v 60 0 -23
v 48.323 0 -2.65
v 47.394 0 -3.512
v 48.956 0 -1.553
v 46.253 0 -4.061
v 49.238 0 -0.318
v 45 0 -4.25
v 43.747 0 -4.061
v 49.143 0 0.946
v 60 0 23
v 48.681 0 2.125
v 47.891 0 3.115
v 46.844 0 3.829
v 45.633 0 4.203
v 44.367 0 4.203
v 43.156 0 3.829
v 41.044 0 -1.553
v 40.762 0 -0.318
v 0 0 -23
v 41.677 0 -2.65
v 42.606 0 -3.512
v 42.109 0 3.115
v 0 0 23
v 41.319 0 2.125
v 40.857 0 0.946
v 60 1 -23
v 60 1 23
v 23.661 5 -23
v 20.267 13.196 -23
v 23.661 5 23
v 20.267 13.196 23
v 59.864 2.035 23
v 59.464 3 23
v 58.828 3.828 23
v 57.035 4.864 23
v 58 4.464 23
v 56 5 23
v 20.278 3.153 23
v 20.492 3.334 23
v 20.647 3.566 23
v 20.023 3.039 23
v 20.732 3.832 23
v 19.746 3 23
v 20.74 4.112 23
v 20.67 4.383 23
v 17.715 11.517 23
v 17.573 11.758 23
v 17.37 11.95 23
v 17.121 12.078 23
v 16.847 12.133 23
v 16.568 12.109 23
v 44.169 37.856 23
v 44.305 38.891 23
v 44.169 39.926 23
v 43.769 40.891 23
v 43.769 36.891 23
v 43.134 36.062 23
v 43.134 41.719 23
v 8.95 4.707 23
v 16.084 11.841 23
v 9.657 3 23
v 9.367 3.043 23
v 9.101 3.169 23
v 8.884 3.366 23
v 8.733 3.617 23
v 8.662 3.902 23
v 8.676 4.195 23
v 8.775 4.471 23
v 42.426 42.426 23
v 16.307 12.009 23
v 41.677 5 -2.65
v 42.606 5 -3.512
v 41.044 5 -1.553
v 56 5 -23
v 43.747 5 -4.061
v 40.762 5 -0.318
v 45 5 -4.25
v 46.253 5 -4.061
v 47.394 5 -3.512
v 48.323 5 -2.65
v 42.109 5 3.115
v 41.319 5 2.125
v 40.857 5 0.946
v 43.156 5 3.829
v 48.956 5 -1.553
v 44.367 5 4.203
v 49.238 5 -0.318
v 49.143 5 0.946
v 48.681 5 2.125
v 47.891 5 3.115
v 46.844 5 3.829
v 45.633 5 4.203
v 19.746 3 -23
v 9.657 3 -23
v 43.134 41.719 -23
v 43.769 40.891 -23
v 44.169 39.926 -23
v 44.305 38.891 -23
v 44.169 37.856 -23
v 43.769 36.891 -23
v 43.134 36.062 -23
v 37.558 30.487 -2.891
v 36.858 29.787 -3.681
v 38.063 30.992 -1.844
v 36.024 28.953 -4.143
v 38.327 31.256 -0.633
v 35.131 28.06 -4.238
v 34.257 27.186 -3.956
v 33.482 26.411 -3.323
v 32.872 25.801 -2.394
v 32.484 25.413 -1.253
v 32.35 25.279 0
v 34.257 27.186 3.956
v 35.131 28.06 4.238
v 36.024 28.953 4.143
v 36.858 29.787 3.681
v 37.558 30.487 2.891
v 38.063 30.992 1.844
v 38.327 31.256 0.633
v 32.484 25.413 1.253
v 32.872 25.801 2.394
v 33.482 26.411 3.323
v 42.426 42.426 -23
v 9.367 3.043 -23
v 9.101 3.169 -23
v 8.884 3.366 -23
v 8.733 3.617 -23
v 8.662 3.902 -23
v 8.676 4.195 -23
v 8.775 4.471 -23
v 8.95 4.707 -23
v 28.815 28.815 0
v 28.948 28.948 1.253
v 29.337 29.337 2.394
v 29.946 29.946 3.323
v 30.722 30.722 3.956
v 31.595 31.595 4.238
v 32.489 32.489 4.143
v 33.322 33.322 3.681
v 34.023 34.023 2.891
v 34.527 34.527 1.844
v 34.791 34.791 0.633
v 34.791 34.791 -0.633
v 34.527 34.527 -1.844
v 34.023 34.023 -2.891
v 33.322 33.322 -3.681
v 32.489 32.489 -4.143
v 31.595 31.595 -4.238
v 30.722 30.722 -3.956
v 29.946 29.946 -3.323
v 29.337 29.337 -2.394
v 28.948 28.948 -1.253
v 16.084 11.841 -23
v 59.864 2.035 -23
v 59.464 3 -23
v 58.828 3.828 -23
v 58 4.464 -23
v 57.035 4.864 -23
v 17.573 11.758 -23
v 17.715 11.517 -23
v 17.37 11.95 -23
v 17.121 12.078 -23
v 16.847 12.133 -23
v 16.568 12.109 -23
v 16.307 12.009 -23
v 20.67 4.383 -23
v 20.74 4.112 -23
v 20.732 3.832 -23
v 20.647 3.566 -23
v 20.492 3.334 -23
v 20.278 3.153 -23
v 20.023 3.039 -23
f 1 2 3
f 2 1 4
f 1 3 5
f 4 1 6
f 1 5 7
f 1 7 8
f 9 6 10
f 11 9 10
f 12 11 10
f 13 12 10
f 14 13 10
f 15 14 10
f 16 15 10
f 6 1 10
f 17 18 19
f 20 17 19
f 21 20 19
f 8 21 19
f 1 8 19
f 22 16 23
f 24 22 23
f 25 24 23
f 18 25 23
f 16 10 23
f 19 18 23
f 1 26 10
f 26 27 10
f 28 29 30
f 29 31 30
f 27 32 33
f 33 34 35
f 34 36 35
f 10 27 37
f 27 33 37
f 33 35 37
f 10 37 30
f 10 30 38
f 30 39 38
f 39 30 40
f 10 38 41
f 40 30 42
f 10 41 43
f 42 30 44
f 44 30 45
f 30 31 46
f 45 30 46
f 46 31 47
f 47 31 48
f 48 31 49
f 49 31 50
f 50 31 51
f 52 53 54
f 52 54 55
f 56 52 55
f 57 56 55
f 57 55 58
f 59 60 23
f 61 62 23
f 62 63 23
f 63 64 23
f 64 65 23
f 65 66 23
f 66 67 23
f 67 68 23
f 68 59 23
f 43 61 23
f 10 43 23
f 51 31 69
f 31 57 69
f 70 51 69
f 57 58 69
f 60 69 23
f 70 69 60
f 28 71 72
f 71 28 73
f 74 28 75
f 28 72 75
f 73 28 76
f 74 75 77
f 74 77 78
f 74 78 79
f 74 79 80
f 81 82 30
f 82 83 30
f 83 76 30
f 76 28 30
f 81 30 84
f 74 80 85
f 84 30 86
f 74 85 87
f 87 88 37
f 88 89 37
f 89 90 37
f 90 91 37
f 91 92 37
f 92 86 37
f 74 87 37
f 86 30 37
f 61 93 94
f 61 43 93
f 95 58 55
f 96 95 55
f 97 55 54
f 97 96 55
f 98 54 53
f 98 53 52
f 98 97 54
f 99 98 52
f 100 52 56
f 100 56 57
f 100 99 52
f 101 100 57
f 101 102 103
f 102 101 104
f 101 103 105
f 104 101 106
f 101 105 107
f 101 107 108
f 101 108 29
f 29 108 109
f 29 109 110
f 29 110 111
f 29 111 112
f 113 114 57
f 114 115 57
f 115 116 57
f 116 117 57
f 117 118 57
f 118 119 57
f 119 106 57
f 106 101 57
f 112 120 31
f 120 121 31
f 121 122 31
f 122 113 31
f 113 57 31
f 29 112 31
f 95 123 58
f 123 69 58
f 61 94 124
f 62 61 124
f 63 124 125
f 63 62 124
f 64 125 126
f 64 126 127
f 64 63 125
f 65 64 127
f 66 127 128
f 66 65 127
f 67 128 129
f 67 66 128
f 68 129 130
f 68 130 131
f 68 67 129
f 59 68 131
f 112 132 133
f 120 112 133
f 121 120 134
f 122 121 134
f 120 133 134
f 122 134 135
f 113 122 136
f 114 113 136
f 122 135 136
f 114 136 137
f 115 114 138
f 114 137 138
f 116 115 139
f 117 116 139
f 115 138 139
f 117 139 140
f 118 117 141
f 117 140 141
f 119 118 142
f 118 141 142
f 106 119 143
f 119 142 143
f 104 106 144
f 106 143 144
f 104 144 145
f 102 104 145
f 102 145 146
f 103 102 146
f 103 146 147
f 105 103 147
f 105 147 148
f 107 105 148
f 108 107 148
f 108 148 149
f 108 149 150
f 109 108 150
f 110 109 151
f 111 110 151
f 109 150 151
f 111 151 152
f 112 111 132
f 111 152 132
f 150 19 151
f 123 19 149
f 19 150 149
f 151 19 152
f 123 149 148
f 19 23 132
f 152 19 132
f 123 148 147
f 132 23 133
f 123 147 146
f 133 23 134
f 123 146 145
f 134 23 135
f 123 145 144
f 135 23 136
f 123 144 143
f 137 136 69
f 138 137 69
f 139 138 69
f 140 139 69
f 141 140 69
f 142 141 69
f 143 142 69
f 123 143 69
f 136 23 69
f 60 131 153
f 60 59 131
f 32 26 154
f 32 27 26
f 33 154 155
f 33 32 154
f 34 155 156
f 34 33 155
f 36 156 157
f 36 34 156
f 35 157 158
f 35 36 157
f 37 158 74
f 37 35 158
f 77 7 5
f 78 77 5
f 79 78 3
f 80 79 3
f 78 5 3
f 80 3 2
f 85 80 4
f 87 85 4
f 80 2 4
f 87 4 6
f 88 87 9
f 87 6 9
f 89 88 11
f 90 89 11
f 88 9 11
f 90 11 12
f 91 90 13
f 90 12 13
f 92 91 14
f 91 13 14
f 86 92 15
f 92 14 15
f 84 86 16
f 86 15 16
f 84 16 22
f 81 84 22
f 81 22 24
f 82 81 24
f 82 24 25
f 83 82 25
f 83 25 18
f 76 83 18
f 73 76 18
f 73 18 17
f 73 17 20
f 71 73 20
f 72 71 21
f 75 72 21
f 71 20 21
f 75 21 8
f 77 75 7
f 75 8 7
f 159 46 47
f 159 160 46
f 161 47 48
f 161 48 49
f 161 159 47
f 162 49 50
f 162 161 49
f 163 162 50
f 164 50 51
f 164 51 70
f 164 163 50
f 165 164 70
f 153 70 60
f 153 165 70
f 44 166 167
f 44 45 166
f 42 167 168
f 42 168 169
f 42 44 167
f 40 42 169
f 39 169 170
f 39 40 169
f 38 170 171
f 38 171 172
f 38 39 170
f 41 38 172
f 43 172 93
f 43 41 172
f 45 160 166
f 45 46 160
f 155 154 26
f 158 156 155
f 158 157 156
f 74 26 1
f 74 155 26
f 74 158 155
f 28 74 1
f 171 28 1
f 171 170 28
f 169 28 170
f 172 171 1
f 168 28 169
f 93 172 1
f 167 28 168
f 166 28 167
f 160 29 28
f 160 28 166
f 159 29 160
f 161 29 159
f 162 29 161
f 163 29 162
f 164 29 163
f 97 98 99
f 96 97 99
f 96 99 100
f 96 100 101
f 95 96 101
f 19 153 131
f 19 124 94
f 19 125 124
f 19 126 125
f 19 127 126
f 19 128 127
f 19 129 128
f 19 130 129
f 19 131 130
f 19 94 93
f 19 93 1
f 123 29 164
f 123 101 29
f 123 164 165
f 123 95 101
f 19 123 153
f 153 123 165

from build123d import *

# Parameters (mm, degrees)
EXTRUDE_1_DEPTH     = 23
SKETCH_2_R          = 4.25
CUT_EXTRUDE_1_DEPTH = 5
SKETCH_3_R          = 4.25
CUT_EXTRUDE_2_DEPTH = 5
FILLET_1_R          = 4
FILLET_2_R          = 1


with BuildPart() as part:
    # Эскиз1 → Бобышка-Вытянуть1 (new body, symmetric)
    with BuildSketch(Plane.XY):
        Polygon((0, 0), (42.426406871, 42.426406871), (45.961940777, 38.890872965), (20.266663343, 13.195595531), (23.661390163, 5), (60, 5), (60, 0), align=None)
        Polygon((17.142135624, 12.899494937), (21.242640687, 3), (7.242640687, 3), align=None, mode=Mode.SUBTRACT)
    extrude(amount=EXTRUDE_1_DEPTH, both=True)

    # Эскиз2 → Вырез-Вытянуть1 (cut)
    with BuildSketch(Plane(origin=(0, 0, 0), x_dir=(0, 0, 1), z_dir=(-0.707106781, 0.707106781, 0))):
        with Locations(Location((0, 45, 0), (0, 0, 270))):  # turned: the seam where the file's is
            Circle(SKETCH_2_R)
    extrude(amount=-CUT_EXTRUDE_1_DEPTH, mode=Mode.SUBTRACT)

    # Эскиз3 → Вырез-Вытянуть2 (cut)
    with BuildSketch(Plane.XZ):
        with Locations(Location((45, 0, 0), (0, 0, 270))):  # turned: the seam where the file's is
            Circle(SKETCH_3_R)
    extrude(amount=-CUT_EXTRUDE_2_DEPTH, mode=Mode.SUBTRACT)

    # Скругление1
    fillet_1_edges = [part.edges().sort_by_distance(p)[0] for p in [
        (45.961940777, 38.890872965, 0),
        (60, 5, 0),
    ]]
    fillet(fillet_1_edges, radius=FILLET_1_R)

    # Скругление2
    fillet_2_edges = [part.edges().sort_by_distance(p)[0] for p in [
        (17.142135624, 12.899494937, 0),
        (7.242640687, 3, 0),
        (21.242640687, 3, 0),
    ]]
    fillet(fillet_2_edges, radius=FILLET_2_R)


solid = part.part
